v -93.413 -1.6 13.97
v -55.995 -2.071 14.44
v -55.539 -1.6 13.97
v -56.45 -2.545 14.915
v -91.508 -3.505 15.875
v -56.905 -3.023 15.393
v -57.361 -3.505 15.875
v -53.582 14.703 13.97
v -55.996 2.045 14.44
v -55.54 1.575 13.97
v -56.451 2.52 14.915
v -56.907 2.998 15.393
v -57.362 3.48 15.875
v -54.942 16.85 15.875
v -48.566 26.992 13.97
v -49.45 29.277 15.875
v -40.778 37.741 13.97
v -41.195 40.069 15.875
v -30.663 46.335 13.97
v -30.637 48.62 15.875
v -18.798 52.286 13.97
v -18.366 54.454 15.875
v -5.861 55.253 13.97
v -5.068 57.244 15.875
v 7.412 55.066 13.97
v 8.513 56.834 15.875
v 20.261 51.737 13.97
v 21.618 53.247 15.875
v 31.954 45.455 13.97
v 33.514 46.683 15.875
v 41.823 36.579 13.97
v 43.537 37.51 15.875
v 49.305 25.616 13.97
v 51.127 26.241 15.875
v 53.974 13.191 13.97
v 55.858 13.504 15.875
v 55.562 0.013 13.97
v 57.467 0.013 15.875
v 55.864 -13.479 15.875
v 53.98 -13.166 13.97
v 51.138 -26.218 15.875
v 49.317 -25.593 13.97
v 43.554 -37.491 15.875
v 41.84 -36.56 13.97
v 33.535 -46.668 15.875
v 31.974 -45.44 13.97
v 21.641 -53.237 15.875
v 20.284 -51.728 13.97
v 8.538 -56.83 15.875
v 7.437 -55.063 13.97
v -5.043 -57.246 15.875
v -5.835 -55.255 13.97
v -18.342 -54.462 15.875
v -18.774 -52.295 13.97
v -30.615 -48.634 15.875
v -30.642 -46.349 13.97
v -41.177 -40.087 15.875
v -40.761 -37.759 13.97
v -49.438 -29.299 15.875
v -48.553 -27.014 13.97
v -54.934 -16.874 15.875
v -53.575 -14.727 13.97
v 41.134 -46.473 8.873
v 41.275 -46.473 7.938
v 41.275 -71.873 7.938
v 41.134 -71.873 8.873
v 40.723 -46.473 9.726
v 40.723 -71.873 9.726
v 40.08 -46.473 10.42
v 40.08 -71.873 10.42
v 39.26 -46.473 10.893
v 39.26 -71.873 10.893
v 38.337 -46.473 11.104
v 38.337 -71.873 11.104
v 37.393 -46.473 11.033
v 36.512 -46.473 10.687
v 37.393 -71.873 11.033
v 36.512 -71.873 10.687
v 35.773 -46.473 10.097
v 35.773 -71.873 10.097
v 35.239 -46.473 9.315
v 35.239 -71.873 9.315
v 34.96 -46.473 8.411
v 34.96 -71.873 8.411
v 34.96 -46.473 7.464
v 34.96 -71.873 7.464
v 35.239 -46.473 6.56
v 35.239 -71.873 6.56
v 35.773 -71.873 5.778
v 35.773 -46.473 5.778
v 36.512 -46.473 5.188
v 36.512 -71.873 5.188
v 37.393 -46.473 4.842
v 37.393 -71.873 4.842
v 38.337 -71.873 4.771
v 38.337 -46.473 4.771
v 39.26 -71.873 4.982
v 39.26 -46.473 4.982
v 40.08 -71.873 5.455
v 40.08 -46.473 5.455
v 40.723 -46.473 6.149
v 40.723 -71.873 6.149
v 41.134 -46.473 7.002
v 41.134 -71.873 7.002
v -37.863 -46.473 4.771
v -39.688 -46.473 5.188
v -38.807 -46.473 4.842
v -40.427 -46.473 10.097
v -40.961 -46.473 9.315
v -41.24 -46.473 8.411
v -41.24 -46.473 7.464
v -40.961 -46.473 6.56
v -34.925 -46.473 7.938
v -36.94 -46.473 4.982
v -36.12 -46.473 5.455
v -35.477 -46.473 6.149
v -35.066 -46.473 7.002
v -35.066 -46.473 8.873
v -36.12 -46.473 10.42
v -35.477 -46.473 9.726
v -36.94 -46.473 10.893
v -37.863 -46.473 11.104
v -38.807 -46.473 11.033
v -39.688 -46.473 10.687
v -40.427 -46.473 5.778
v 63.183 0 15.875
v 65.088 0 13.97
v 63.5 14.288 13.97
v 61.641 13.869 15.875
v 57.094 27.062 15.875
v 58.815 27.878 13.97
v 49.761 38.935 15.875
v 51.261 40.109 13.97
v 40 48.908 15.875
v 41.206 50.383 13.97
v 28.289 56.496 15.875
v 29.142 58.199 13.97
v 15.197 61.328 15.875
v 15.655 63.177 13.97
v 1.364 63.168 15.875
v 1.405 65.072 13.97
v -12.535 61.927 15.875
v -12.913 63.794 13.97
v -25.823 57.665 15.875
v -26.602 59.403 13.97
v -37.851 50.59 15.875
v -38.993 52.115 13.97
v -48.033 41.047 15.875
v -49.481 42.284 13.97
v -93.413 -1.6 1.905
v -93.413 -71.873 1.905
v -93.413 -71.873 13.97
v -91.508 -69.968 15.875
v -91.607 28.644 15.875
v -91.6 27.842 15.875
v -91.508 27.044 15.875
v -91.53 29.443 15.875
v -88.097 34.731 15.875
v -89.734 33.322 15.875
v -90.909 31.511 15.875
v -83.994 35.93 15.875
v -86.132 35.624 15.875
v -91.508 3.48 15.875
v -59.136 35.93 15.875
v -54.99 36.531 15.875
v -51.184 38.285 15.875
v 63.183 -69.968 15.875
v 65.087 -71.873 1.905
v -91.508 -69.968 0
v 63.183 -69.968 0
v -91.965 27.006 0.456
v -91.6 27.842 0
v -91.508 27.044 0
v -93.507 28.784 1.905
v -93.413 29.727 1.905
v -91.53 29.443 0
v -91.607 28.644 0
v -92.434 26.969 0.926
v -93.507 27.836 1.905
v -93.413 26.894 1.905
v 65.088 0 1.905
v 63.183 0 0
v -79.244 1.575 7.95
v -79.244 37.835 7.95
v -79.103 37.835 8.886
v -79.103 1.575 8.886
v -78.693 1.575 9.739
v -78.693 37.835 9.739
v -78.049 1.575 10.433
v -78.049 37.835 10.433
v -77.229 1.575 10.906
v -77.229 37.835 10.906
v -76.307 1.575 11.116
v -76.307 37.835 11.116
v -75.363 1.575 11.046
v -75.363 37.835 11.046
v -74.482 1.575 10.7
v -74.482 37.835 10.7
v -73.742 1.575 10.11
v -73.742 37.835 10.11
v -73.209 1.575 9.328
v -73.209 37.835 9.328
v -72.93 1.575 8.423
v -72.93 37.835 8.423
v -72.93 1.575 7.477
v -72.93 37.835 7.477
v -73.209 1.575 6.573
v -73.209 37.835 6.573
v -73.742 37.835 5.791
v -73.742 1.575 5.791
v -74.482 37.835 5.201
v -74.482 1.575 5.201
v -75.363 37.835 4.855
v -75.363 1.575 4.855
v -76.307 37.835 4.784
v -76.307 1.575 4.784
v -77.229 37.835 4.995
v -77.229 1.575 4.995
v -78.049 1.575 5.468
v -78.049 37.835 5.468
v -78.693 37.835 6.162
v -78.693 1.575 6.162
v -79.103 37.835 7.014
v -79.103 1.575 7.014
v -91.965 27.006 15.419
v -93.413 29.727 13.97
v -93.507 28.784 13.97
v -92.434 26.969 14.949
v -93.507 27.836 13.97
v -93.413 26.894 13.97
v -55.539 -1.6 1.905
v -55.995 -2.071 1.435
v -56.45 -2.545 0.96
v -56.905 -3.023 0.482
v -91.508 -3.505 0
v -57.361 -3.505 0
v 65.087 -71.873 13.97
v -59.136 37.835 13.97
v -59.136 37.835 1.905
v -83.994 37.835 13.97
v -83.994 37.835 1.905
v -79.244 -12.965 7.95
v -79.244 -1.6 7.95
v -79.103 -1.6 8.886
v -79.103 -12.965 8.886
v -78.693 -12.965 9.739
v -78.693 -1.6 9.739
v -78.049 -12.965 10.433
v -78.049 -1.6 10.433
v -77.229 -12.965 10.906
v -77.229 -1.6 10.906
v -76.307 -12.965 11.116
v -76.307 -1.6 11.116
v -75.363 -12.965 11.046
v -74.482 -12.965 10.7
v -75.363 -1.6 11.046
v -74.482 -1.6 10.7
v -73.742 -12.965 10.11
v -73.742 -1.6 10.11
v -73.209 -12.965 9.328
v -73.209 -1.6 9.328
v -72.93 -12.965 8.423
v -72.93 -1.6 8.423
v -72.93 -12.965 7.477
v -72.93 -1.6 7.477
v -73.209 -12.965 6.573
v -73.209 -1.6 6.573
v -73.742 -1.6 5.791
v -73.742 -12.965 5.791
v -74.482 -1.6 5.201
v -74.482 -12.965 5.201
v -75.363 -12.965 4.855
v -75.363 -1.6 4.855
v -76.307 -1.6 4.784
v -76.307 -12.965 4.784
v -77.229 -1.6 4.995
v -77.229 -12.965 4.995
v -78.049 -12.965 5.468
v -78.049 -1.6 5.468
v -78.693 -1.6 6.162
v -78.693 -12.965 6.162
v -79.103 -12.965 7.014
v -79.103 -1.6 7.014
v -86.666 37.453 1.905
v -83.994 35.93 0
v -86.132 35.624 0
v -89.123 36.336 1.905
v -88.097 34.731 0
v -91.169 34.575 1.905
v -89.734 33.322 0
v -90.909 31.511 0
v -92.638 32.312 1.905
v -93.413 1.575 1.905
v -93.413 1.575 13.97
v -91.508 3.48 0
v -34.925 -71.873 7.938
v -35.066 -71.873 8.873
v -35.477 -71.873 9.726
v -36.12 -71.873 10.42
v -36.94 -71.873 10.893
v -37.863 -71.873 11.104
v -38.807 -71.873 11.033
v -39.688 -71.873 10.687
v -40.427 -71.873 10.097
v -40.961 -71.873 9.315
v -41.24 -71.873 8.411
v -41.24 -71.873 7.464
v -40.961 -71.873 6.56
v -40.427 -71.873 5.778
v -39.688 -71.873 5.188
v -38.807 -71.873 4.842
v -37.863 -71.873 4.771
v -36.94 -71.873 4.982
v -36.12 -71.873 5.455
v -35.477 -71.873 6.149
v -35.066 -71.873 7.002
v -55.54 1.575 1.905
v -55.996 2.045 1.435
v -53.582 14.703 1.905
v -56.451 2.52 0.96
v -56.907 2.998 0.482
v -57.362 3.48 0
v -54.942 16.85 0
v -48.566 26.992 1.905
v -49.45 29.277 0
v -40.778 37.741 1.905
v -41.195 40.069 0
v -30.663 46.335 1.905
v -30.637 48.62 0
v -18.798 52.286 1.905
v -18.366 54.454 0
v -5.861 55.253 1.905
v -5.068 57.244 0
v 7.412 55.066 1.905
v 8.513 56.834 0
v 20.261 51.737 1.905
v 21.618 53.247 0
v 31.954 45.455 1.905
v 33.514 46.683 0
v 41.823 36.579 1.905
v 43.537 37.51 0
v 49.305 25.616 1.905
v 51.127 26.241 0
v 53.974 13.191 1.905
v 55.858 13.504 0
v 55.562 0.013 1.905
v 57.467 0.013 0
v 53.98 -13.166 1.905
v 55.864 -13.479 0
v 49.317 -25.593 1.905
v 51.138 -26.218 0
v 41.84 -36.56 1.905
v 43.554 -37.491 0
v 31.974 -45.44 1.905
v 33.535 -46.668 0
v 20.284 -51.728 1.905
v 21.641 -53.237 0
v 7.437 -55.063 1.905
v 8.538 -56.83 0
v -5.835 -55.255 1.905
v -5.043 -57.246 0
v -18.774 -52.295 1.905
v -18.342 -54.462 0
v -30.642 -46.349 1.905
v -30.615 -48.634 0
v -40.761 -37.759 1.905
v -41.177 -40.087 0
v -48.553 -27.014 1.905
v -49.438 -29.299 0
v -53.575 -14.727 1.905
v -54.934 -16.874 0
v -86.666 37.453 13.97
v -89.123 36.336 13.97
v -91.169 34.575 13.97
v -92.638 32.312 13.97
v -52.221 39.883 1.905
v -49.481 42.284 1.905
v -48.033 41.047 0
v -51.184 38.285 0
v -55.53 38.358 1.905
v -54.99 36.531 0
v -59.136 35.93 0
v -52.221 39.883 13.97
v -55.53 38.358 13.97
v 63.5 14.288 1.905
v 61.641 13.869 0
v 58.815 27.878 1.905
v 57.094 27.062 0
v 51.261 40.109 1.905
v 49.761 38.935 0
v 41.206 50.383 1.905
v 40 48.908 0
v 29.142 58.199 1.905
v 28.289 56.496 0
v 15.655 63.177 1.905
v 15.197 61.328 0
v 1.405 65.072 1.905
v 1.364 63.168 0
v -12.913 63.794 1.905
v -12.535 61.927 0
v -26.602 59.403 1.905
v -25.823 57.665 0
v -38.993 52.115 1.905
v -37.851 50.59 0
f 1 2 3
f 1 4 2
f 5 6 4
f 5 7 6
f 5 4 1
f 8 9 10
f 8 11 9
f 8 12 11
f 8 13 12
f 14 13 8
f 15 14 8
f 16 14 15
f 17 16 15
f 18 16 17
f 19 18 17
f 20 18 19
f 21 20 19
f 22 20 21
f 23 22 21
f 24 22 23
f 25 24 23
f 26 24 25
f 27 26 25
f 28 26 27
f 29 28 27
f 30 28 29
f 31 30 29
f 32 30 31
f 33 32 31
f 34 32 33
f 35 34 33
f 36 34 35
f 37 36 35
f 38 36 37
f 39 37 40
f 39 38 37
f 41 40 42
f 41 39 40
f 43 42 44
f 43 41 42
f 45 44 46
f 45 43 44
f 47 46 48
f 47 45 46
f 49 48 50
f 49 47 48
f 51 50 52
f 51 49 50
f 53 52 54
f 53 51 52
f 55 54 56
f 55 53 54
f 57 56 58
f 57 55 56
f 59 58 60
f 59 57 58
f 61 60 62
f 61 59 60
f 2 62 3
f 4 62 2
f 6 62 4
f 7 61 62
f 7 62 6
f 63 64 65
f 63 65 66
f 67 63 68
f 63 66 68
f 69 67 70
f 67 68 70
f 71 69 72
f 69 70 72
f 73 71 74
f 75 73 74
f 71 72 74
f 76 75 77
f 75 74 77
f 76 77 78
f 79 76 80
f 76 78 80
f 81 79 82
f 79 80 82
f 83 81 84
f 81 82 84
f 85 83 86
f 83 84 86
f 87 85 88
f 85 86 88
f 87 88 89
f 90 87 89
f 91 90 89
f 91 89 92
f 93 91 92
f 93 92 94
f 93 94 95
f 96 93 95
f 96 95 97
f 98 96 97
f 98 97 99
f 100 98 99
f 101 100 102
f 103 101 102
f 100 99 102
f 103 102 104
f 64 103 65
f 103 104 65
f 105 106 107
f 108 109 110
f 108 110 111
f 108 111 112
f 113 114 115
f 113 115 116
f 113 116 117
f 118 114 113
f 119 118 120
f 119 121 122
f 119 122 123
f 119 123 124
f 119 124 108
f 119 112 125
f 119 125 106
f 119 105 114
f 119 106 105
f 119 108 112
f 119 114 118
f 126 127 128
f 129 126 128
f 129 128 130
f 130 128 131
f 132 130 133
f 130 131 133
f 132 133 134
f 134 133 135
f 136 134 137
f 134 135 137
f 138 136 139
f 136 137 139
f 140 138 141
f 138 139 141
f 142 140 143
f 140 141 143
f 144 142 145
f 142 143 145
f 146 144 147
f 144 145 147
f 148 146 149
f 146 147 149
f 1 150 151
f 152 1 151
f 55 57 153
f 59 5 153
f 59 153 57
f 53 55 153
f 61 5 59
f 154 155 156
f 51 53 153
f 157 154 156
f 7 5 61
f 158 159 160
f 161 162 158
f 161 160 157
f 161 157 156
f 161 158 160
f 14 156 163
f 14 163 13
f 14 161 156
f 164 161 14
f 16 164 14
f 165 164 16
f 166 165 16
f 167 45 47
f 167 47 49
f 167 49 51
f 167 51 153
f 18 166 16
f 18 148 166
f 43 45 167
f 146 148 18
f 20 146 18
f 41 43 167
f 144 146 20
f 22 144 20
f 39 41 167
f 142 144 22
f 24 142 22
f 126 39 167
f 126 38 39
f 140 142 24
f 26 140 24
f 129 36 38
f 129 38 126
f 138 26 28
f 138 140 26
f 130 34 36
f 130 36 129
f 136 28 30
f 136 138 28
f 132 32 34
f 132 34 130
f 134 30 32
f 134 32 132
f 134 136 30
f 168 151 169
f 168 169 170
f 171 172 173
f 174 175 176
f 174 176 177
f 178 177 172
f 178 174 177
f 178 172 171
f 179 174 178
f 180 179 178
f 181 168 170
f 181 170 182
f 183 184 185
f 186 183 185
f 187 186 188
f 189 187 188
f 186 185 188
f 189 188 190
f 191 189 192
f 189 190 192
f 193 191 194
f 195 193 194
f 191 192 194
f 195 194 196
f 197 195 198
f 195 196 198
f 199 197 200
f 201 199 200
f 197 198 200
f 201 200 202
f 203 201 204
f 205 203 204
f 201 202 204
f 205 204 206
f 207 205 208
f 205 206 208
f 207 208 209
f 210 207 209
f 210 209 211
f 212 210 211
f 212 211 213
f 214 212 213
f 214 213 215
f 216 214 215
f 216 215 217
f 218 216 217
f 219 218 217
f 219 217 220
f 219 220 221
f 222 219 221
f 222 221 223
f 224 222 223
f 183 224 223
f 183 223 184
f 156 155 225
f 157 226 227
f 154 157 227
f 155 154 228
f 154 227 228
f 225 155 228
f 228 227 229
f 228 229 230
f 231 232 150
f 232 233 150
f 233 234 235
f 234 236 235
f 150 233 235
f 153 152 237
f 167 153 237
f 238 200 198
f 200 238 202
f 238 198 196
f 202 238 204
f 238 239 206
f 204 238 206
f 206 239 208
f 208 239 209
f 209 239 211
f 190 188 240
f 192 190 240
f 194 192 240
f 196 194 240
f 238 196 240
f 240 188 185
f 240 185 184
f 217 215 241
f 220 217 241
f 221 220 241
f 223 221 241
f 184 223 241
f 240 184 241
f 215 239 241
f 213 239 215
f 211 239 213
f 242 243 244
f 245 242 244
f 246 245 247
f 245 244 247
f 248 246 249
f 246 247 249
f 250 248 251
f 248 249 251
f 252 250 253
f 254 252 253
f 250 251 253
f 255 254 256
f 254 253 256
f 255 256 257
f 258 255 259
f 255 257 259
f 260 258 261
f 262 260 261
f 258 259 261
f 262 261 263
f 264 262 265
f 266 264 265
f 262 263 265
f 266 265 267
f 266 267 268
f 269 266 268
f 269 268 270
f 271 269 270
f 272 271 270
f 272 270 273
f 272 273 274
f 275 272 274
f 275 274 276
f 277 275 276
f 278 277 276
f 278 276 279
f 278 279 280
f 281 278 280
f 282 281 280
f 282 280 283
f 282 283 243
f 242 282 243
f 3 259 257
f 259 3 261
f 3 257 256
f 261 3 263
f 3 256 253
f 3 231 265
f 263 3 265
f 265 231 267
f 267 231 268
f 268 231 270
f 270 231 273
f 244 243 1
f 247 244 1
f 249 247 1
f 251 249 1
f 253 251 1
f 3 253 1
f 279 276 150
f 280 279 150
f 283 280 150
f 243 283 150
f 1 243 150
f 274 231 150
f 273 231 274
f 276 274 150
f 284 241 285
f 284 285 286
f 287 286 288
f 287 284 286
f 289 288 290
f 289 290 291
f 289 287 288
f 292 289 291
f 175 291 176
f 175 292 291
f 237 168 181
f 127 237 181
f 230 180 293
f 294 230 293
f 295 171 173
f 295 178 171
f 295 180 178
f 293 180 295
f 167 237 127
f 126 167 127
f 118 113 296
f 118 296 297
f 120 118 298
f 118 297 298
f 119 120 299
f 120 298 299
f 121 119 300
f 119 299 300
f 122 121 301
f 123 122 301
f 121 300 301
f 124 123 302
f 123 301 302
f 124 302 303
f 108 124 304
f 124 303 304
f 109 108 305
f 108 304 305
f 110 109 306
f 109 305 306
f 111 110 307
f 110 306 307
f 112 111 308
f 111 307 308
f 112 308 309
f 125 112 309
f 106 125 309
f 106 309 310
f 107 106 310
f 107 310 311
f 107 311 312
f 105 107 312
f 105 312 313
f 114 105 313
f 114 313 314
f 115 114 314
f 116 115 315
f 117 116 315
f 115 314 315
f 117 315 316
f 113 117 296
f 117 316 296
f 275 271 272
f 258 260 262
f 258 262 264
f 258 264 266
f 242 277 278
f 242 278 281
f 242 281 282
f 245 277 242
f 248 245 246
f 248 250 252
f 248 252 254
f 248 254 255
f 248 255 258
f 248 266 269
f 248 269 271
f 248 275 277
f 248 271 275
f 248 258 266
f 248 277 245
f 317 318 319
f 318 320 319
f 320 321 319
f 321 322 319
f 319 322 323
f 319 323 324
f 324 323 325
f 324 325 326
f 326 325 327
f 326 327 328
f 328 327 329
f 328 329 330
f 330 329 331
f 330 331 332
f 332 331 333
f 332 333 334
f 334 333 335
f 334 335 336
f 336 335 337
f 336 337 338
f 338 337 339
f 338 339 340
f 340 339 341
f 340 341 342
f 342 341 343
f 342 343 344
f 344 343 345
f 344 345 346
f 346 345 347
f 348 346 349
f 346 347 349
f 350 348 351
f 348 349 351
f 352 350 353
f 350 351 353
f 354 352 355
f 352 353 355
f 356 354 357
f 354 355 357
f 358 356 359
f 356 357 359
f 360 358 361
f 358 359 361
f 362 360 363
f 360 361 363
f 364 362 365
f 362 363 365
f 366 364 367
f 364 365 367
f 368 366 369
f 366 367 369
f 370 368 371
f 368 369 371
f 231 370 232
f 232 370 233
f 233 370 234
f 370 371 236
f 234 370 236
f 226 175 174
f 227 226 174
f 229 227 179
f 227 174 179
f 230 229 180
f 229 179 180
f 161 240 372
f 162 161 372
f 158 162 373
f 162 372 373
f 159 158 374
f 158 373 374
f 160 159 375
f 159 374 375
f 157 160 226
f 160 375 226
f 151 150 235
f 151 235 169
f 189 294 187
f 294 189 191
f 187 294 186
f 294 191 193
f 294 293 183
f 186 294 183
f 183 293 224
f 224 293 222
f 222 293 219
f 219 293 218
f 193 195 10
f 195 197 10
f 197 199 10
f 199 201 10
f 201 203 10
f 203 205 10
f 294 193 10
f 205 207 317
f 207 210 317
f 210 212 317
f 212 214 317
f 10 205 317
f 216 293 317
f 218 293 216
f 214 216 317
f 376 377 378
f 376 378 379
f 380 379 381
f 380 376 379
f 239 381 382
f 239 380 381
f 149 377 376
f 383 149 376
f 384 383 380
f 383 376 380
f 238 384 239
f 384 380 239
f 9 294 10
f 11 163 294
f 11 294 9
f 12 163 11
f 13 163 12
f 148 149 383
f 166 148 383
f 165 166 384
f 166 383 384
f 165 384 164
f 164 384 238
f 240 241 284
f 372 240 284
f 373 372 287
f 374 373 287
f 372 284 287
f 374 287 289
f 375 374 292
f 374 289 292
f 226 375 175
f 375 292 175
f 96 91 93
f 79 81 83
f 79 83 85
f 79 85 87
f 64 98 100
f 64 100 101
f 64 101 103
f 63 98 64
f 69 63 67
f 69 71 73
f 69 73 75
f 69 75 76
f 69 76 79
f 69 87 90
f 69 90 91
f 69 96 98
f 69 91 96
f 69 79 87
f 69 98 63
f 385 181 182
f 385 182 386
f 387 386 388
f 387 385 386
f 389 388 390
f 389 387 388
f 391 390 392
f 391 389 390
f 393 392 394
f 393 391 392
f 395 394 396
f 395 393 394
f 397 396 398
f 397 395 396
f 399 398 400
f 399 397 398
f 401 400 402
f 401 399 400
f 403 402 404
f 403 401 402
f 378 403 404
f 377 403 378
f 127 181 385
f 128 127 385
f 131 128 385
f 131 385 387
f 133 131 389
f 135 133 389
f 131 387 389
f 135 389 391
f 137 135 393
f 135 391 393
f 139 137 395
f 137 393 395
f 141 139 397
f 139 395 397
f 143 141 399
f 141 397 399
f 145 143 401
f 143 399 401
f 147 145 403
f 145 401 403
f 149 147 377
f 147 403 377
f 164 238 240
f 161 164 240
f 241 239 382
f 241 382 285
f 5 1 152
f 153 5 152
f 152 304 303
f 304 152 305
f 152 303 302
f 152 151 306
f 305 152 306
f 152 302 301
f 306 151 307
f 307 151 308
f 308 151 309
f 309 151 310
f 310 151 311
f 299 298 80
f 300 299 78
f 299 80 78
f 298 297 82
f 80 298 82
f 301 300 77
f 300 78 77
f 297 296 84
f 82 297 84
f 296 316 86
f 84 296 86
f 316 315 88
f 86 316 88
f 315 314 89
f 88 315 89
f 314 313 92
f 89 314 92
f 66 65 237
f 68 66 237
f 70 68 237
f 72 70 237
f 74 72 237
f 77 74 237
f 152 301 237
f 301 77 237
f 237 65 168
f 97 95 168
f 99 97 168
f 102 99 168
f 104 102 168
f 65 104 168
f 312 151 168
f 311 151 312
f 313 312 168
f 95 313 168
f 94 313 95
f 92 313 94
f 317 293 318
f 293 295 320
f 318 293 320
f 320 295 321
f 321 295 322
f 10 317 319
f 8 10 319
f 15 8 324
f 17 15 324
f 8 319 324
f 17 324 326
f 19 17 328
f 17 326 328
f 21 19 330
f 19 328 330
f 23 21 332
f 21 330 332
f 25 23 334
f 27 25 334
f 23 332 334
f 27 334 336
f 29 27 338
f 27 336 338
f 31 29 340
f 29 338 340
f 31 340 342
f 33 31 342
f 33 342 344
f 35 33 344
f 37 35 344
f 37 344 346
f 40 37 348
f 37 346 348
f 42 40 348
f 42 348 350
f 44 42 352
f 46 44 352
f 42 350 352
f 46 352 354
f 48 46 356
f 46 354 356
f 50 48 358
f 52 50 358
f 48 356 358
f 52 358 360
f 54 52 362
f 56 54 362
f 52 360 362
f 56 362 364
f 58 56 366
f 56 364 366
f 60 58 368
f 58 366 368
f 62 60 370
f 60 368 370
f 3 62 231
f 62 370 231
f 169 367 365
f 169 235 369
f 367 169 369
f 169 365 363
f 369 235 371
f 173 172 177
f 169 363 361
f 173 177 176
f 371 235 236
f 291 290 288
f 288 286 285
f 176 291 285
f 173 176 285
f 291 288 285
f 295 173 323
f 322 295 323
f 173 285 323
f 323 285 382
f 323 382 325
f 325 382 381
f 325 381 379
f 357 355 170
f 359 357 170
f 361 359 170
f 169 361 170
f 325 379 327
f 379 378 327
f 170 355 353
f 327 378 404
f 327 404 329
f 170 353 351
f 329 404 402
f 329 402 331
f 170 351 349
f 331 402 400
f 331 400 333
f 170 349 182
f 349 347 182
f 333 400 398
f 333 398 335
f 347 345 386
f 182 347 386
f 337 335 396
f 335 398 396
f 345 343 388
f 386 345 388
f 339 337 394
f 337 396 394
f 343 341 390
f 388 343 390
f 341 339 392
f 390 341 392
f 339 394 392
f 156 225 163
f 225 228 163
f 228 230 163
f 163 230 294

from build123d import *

# Parameters (mm, degrees)
F1_DEPTH = 15.875
F2_R     = 3.175
F3_DEPTH = 50.8
F4_R     = 3.175
F5_DEPTH = 25.4
F6_SIZE  = 1.905


with BuildPart() as f1:
    # F0 (on Top) → F1 (new body)
    with BuildSketch(Plane.XY):
        with BuildLine():
            ThreePointArc((-55.540178, 1.5748), (55.562499, 0.012705), (-55.539452, -1.6002))
            Line((-55.539452, -1.6002), (-93.413361, -1.6002))
            Line((-93.413361, -1.6002), (-93.413361, -71.873484))
            Line((-93.413361, -71.873484), (65.0875, -71.873484))
            Line((65.0875, -71.873484), (65.0875, 0))
            ThreePointArc((65.0875, 0), (22.536226, 61.061454), (-49.481386, 42.284454))
            ThreePointArc((-49.481386, 42.284454), (-53.820886, 39.000936), (-59.136291, 37.835079))
            Line((-59.136291, 37.835079), (-83.994267, 37.835079))
            ThreePointArc((-83.994267, 37.835079), (-90.208527, 35.528708), (-93.413361, 29.726516))
            Line((-93.413361, 29.726516), (-93.413361, 26.893643))
            Line((-93.413361, 26.893643), (-93.413361, 1.5748))
            Line((-93.413361, 1.5748), (-55.540178, 1.5748))
        make_face()
        with BuildLine():
            ThreePointArc((-93.413361, 29.726516), (-93.519267, 28.310079), (-93.413361, 26.893643))
            Line((-93.413361, 26.893643), (-93.413361, 29.726516))
        make_face()
    extrude(amount=F1_DEPTH)

    # F2 (on face) → F3 (cut)
    with BuildSketch(Plane(origin=(0, 37.835079, 0), x_dir=(-1, 0, 0), z_dir=(0, 1, 0))):
        with Locations((76.069467, 7.9502)):
            Circle(F2_R)
    extrude(amount=-F3_DEPTH, mode=Mode.SUBTRACT)

    # F4 (on face) → F5 (cut)
    with BuildSketch(Plane.XZ.offset(71.873484)):
        with Locations((-38.1, 7.9375)):
            Circle(F4_R)
        with Locations((38.1, 7.9375)):
            Circle(F4_R)
    extrude(amount=-F5_DEPTH, mode=Mode.SUBTRACT)

    # F6
    f6_edges = [f1.edges().sort_by_distance(p)[0] for p in [
        (55.562499, 0.012705, 15.875),
        (-74.476406, -1.6002, 15.875),
        (-93.413361, -36.736842, 15.875),
        (-14.16293, -71.873484, 15.875),
        (65.0875, -35.936742, 15.875),
        (22.536226, 61.061454, 15.875),
        (-53.820886, 39.000936, 15.875),
        (-71.565279, 37.835079, 15.875),
        (-91.212895, 34.52434, 15.875),
        (-93.413361, 14.234221, 15.875),
        (-74.476769, 1.5748, 15.875),
        (55.562499, 0.012705, 0),
        (-74.476406, -1.6002, 0),
        (-93.413361, -36.736842, 0),
        (-14.16293, -71.873484, 0),
        (65.0875, -35.936742, 0),
        (22.536226, 61.061454, 0),
        (-53.820886, 39.000936, 0),
        (-71.565279, 37.835079, 0),
        (-91.212895, 34.52434, 0),
        (-93.413361, 14.234221, 0),
        (-74.476769, 1.5748, 0),
    ]]
    chamfer(f6_edges, length=F6_SIZE)


solid = f1.part
